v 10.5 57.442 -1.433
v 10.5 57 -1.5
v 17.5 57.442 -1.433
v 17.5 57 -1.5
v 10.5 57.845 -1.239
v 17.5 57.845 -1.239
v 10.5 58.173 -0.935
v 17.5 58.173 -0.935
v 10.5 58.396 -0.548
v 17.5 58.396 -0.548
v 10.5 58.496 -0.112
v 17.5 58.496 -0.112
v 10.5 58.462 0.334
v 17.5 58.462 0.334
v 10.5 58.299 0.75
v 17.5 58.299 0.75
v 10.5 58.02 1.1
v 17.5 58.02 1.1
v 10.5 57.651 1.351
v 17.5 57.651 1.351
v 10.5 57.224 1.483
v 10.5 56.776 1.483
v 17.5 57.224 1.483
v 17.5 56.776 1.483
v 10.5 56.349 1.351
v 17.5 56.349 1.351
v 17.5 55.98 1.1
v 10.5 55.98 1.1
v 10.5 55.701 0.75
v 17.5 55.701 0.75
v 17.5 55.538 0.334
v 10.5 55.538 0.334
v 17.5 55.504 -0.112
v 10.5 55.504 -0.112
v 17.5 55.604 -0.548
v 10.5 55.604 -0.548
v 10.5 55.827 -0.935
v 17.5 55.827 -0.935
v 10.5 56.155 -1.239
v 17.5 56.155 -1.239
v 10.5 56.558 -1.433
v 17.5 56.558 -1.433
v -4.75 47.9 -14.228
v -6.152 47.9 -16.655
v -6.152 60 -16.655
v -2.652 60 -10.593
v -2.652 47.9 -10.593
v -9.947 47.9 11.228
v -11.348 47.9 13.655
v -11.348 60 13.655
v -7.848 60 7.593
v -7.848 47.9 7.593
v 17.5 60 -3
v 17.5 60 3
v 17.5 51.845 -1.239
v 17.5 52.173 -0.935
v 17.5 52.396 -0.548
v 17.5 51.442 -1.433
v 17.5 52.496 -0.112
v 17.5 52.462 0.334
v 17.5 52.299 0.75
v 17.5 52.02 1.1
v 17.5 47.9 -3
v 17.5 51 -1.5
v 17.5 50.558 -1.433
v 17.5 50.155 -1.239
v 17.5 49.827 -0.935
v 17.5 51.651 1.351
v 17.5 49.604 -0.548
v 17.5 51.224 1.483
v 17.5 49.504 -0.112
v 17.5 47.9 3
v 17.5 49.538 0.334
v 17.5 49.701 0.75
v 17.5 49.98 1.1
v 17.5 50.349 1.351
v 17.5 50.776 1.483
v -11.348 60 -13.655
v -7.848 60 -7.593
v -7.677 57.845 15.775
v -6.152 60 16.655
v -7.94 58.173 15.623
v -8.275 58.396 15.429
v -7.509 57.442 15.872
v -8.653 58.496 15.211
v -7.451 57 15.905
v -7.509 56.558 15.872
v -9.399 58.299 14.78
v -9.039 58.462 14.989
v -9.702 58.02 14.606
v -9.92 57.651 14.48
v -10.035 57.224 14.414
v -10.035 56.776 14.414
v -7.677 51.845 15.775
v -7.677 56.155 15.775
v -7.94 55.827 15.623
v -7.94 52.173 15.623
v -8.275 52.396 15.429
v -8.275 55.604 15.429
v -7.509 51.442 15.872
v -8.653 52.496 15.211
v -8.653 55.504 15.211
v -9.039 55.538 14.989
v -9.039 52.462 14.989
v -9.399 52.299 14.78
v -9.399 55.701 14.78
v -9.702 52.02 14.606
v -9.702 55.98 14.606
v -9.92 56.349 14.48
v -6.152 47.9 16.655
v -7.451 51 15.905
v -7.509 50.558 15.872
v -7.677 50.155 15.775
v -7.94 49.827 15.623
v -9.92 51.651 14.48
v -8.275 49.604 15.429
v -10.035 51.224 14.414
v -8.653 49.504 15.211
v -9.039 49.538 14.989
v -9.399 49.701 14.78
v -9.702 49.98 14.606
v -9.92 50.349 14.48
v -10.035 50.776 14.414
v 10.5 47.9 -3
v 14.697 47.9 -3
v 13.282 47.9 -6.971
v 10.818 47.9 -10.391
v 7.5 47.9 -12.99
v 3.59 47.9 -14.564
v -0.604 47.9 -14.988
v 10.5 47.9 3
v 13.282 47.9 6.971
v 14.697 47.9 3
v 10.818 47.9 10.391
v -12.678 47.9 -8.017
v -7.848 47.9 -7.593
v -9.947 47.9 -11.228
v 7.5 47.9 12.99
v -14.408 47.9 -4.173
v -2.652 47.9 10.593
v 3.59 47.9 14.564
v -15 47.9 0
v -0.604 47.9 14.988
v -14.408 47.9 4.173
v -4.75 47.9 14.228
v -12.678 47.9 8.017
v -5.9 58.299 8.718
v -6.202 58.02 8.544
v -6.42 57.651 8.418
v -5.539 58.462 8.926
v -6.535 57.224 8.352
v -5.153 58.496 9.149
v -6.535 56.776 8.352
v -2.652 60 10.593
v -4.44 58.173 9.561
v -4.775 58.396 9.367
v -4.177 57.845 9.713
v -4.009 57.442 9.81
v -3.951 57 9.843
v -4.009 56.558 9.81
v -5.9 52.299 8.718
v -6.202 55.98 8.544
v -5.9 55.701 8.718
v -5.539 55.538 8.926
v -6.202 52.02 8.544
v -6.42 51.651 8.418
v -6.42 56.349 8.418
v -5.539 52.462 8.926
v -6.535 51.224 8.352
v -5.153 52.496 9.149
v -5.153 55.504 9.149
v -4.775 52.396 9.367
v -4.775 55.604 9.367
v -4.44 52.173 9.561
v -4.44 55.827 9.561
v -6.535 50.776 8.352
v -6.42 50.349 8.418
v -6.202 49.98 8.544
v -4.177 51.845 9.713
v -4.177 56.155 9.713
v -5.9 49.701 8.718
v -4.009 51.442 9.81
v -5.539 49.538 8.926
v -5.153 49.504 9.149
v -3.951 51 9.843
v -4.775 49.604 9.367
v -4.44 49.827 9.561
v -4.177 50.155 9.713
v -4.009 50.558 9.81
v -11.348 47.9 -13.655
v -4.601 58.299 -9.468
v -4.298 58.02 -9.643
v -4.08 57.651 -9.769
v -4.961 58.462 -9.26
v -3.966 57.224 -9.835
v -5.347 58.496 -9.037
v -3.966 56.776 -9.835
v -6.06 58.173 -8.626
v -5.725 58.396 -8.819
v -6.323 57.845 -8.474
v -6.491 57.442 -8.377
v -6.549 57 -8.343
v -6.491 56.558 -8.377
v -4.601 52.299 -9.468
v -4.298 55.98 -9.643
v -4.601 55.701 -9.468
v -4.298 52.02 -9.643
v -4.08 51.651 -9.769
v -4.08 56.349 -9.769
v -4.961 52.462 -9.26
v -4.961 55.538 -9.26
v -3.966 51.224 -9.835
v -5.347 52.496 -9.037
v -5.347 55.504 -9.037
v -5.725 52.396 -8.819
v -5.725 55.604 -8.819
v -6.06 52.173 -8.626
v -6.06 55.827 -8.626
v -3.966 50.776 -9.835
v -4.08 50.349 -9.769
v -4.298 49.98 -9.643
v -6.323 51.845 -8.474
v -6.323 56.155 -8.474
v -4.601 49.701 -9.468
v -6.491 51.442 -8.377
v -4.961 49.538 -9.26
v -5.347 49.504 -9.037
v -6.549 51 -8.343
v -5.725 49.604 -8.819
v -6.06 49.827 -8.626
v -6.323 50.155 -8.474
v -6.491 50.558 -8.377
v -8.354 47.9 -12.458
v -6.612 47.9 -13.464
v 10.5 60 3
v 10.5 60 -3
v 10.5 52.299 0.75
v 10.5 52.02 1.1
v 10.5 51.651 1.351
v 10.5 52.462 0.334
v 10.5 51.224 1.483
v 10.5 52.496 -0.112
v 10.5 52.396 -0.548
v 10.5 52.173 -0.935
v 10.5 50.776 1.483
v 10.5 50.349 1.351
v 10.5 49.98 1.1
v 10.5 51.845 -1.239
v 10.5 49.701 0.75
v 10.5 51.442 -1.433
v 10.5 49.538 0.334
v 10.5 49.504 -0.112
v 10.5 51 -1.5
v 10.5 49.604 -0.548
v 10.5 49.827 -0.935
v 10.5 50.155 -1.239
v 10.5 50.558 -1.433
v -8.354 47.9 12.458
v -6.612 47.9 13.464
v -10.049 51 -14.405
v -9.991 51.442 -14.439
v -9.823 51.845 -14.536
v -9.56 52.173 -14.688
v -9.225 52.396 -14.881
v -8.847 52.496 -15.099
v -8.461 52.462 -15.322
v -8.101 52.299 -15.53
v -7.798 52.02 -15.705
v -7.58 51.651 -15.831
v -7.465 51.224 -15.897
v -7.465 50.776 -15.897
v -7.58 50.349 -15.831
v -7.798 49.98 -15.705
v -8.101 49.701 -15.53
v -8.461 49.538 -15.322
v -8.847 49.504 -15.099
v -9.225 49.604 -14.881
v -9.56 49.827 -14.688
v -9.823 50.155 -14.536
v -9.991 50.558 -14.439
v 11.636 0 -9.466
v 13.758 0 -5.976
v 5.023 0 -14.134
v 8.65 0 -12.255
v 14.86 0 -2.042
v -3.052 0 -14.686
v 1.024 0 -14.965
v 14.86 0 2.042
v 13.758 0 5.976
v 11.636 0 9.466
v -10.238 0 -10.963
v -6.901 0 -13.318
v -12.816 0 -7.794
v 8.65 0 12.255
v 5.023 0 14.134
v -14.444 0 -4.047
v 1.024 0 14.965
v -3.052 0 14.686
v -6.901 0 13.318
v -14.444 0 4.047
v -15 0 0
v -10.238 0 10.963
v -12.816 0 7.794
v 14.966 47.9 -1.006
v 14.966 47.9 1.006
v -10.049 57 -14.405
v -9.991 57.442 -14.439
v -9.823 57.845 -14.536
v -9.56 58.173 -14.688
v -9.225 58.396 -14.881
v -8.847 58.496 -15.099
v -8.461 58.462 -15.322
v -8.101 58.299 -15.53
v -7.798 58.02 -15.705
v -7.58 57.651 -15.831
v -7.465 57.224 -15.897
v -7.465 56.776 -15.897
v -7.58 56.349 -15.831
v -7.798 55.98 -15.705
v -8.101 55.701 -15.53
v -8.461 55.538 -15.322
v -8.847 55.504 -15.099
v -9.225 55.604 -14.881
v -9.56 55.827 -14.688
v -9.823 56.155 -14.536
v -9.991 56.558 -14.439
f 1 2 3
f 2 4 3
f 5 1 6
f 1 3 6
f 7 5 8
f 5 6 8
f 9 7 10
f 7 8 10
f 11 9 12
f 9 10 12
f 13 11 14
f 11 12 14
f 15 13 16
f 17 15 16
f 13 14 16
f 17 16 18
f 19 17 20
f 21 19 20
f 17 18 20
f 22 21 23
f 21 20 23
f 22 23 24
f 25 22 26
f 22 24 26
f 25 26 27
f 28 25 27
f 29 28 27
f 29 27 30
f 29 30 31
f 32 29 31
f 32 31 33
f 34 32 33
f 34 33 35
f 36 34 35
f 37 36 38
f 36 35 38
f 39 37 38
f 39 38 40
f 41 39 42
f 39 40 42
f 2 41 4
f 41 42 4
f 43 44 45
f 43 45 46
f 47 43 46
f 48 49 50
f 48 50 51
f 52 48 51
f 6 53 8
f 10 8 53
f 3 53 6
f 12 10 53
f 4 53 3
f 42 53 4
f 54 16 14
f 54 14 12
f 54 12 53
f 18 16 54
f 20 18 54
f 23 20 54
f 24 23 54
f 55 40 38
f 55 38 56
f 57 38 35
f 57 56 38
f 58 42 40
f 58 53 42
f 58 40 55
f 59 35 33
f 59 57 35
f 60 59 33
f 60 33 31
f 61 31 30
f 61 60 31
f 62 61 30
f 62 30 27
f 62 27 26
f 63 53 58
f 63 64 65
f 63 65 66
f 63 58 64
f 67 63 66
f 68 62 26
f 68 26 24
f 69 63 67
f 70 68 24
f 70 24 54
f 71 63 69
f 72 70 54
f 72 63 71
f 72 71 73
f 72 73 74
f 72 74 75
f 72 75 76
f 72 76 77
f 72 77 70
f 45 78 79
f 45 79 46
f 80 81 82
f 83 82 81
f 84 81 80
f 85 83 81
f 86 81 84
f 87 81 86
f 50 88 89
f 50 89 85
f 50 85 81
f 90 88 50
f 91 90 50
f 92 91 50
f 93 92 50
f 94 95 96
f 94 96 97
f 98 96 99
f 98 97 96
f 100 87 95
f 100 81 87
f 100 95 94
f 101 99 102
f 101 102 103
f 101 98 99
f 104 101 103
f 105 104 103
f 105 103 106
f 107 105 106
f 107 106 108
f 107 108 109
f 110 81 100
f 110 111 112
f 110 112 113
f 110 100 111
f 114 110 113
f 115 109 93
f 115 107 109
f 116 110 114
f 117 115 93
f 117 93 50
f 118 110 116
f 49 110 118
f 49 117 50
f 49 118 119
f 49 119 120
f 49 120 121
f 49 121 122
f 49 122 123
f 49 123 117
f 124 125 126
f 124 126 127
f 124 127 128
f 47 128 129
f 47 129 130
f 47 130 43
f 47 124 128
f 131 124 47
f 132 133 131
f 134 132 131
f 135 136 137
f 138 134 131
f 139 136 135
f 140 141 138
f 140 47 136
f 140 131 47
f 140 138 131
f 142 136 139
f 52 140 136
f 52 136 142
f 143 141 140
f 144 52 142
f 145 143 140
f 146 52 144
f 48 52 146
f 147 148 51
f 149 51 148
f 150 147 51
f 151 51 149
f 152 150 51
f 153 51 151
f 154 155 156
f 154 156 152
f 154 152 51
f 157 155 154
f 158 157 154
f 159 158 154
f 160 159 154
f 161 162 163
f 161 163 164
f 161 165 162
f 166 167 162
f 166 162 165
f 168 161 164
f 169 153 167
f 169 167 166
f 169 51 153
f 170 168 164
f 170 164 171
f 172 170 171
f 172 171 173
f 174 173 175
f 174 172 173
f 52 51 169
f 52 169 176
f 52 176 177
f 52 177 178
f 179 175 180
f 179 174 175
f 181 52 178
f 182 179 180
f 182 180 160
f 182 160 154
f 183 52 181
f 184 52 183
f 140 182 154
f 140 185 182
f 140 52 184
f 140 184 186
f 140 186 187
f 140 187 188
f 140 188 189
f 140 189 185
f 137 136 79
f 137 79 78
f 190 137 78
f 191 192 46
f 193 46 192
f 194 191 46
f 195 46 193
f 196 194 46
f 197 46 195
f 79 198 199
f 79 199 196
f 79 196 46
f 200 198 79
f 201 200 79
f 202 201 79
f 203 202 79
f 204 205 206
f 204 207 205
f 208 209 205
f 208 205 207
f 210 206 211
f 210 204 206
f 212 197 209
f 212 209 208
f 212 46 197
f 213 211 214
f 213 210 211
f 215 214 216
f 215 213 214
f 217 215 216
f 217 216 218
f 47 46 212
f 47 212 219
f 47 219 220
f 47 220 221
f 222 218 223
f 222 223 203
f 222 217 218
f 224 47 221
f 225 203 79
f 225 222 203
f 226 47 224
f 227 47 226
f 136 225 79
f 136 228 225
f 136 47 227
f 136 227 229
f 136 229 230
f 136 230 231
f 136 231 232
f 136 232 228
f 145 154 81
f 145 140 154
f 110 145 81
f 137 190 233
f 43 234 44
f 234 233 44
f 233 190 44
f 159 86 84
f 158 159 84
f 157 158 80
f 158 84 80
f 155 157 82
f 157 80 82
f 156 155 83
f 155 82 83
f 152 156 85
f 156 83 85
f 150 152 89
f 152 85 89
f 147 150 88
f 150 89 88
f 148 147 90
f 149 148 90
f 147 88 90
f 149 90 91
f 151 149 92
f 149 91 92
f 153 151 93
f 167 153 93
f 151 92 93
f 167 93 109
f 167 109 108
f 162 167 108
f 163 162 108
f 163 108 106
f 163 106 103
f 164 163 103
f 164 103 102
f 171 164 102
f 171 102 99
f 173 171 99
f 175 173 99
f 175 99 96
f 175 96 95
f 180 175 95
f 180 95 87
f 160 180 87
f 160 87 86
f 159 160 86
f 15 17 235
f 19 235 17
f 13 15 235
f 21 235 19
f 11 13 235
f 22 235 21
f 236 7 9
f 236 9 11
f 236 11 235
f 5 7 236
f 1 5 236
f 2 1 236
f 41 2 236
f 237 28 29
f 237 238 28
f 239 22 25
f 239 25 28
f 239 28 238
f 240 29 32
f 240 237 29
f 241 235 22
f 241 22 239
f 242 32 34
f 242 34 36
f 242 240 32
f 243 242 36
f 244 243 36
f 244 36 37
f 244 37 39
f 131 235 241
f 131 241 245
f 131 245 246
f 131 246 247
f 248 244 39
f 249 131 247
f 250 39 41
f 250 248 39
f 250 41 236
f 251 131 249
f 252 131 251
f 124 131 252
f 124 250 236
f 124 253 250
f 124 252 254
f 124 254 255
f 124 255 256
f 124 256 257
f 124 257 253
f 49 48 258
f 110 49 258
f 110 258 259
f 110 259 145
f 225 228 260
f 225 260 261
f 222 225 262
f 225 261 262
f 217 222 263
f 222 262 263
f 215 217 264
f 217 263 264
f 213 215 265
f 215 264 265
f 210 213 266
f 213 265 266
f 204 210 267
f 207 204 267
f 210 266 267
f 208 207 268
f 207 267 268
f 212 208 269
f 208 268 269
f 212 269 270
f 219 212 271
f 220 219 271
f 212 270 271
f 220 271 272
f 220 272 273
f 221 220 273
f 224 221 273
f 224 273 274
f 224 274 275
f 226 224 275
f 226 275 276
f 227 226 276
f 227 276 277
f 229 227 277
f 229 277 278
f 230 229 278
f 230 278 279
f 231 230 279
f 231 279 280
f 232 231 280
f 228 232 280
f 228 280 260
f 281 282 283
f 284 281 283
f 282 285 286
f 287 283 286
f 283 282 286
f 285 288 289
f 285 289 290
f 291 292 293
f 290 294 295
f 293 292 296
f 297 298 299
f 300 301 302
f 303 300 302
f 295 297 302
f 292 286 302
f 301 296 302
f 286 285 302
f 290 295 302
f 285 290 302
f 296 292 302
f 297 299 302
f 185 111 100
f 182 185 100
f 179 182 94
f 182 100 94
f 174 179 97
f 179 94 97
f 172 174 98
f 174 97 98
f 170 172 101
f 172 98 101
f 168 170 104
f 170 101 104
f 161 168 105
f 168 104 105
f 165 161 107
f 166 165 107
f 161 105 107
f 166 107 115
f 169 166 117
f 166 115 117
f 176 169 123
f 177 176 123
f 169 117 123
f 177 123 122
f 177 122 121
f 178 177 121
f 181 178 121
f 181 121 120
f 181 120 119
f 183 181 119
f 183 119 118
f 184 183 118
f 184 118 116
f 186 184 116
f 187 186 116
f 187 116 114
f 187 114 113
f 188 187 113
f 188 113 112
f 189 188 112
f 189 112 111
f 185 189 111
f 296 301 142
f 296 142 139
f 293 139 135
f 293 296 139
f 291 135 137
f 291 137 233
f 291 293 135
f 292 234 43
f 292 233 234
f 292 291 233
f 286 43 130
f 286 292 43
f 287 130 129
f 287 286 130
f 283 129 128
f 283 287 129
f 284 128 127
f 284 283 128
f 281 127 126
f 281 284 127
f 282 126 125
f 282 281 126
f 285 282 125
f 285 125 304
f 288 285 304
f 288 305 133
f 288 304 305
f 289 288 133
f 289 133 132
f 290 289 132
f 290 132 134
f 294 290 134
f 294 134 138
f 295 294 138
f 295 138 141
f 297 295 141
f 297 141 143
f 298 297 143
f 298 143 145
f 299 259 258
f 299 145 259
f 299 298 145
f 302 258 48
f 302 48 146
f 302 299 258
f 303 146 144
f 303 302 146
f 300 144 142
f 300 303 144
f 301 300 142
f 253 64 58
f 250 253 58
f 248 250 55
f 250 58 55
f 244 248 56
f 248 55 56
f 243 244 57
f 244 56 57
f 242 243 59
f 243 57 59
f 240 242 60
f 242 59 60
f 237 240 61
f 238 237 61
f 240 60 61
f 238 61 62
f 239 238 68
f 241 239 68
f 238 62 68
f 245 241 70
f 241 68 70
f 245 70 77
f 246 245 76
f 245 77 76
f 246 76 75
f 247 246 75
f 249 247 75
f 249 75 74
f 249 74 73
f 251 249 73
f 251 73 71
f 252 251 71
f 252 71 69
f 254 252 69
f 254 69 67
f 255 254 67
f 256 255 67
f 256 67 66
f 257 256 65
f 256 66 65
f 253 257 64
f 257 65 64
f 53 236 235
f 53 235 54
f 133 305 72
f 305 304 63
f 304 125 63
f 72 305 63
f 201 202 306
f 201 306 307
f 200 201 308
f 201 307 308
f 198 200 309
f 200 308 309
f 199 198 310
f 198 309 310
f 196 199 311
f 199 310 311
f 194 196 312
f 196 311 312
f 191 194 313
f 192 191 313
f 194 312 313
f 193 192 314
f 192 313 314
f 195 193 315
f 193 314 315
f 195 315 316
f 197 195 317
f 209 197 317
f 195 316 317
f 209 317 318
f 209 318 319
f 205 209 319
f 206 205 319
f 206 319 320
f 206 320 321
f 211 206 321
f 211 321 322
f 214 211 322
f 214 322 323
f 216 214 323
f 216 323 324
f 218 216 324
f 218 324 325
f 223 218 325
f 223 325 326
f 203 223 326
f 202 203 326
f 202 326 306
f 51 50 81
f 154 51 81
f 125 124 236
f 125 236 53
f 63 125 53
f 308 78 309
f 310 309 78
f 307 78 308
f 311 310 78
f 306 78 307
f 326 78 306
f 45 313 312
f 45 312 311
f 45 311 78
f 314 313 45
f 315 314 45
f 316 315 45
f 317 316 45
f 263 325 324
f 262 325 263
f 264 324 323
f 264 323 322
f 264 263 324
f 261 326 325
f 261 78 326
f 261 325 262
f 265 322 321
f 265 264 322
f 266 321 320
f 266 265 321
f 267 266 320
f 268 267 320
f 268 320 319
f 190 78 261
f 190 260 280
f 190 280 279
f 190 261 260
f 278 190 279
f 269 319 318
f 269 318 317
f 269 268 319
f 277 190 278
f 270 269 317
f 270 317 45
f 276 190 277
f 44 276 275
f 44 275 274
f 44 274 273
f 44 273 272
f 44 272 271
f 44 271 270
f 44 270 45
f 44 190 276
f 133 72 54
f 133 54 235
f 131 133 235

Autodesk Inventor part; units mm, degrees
ref_plane "YZ Plane" through (0, 0, 0) normal (1, 0, 0) x (0, 1, 0)
ref_plane "XZ Plane" through (0, 0, 0) normal (0, 1, 0) x (-1, 0, 0)
ref_plane "XY Plane" through (0, 0, 0) normal (0, 0, 1) x (1, 0, 0)
sketch "Sketch1" plane through (0, 0, 0) normal (0, 1, 0) x (-1, 0, 0)
  circle A0 centre (0, 0) radius 15
  dimension "d0" = 30
extrude "Extrusion1" add sketch "Sketch1" along normal blind 47.9
sketch "Sketch2" plane through (0, 47.9, 0) normal (0, 1, 0) x (1, 0, 0)
  circle A0 centre (0, 0) radius 10.5
  line L0 (10.5, 0) -> (10.5, 3)
  line L1 (10.5, 3) -> (17.5, 3)
  line L2 (17.5, 3) -> (17.5, -3)
  line L3 (17.5, -3) -> (10.5, -3)
  line L4 (10.5, -3) -> (10.5, 0)
  line L5 (-5.25, 9.0933) -> (-7.8481, 7.5933)
  line L6 (-7.8481, 7.5933) -> (-11.3481, 13.6554)
  line L7 (-11.3481, 13.6554) -> (-6.1519, 16.6554)
  line L8 (-6.1519, 16.6554) -> (-2.6519, 10.5933)
  line L9 (-2.6519, 10.5933) -> (-5.25, 9.0933)
  line L10 (-5.25, -9.0933) -> (-2.6519, -10.5933)
  line L11 (-2.6519, -10.5933) -> (-6.1519, -16.6554)
  line L12 (-6.1519, -16.6554) -> (-11.3481, -13.6554)
  line L13 (-11.3481, -13.6554) -> (-7.8481, -7.5933)
  line L14 (-7.8481, -7.5933) -> (-5.25, -9.0933)
  line L15 (0, 0) -> (-5.25, 9.0933)
  line L16 (0, 0) -> (10.5, 0)
  dimension "d4" = 21
  dimension "d5" = 3
  dimension "d6" = 7
  dimension "d7" = 6
  dimension "d10" = 360
  dimension "d12" = 120
extrude "Extrusion2" add sketch "Sketch2" along normal blind 12.1 contours L10 L11 L12 L13 L14 | L5 L6 L7 L8 L9 | L0 L1 L2 L3 L4
sketch "Sketch4" plane through (17.5, 47.9, 3) normal (1, 0, 0) x (0, 0, -1)
  line L0 (6, 12.1) -> (0, 12.1) projected
  line L1 (3, 12.1) -> (3, 9.1)
  line L2 (3, 9.1) -> (3, 3.1)
  circle A0 centre (3, 9.1) radius 1.5
  circle A1 centre (3, 3.1) radius 1.5
  point P0 (3, -47.9)
  dimension "d15" = 3
  dimension "d16" = 6
  dimension "d17" = 3
  dimension "d18" = 3
extrude "Extrusion3" cut sketch "Sketch4" against normal through all
sketch "Sketch5" plane through (-6.1519, 47.9, 16.6554) normal (-0.5, 0, 0.866) x (0.866, 0, 0.5)
  line L0 (-6, 12.1) -> (0, 12.1) projected
  line L1 (-3, 12.1) -> (-3, 9.1)
  line L2 (-3, 9.1) -> (-3, 3.1)
  circle A0 centre (-3, 9.1) radius 1.5
  circle A1 centre (-3, 3.1) radius 1.5
  point P0 (-3, -47.9)
  dimension "d21" = 3
  dimension "d22" = 6
  dimension "d23" = 3
  dimension "d24" = 3
extrude "Extrusion4" cut sketch "Sketch5" against normal through all
sketch "Sketch6" plane through (-11.3481, 47.9, -13.6554) normal (-0.5, 0, -0.866) x (-0.866, 0, 0.5)
  line L0 (8.2279, 0) -> (-14.2279, 0) projected
  line L1 (0, 12.1) -> (-6, 12.1) projected
  line L2 (-3, 12.1) -> (-3, 9.1)
  line L3 (-3, 9.1) -> (-3, 3.1)
  circle A0 centre (-3, 9.1) radius 1.5
  circle A1 centre (-3, 3.1) radius 1.5
  point P0 (-3, -47.9)
  dimension "d27" = 3
  dimension "d28" = 6
  dimension "d29" = 3
  dimension "d30" = 3
extrude "Extrusion5" cut sketch "Sketch6" against normal through all
properties part number "Cilindro" material "Aluminum 6061"
